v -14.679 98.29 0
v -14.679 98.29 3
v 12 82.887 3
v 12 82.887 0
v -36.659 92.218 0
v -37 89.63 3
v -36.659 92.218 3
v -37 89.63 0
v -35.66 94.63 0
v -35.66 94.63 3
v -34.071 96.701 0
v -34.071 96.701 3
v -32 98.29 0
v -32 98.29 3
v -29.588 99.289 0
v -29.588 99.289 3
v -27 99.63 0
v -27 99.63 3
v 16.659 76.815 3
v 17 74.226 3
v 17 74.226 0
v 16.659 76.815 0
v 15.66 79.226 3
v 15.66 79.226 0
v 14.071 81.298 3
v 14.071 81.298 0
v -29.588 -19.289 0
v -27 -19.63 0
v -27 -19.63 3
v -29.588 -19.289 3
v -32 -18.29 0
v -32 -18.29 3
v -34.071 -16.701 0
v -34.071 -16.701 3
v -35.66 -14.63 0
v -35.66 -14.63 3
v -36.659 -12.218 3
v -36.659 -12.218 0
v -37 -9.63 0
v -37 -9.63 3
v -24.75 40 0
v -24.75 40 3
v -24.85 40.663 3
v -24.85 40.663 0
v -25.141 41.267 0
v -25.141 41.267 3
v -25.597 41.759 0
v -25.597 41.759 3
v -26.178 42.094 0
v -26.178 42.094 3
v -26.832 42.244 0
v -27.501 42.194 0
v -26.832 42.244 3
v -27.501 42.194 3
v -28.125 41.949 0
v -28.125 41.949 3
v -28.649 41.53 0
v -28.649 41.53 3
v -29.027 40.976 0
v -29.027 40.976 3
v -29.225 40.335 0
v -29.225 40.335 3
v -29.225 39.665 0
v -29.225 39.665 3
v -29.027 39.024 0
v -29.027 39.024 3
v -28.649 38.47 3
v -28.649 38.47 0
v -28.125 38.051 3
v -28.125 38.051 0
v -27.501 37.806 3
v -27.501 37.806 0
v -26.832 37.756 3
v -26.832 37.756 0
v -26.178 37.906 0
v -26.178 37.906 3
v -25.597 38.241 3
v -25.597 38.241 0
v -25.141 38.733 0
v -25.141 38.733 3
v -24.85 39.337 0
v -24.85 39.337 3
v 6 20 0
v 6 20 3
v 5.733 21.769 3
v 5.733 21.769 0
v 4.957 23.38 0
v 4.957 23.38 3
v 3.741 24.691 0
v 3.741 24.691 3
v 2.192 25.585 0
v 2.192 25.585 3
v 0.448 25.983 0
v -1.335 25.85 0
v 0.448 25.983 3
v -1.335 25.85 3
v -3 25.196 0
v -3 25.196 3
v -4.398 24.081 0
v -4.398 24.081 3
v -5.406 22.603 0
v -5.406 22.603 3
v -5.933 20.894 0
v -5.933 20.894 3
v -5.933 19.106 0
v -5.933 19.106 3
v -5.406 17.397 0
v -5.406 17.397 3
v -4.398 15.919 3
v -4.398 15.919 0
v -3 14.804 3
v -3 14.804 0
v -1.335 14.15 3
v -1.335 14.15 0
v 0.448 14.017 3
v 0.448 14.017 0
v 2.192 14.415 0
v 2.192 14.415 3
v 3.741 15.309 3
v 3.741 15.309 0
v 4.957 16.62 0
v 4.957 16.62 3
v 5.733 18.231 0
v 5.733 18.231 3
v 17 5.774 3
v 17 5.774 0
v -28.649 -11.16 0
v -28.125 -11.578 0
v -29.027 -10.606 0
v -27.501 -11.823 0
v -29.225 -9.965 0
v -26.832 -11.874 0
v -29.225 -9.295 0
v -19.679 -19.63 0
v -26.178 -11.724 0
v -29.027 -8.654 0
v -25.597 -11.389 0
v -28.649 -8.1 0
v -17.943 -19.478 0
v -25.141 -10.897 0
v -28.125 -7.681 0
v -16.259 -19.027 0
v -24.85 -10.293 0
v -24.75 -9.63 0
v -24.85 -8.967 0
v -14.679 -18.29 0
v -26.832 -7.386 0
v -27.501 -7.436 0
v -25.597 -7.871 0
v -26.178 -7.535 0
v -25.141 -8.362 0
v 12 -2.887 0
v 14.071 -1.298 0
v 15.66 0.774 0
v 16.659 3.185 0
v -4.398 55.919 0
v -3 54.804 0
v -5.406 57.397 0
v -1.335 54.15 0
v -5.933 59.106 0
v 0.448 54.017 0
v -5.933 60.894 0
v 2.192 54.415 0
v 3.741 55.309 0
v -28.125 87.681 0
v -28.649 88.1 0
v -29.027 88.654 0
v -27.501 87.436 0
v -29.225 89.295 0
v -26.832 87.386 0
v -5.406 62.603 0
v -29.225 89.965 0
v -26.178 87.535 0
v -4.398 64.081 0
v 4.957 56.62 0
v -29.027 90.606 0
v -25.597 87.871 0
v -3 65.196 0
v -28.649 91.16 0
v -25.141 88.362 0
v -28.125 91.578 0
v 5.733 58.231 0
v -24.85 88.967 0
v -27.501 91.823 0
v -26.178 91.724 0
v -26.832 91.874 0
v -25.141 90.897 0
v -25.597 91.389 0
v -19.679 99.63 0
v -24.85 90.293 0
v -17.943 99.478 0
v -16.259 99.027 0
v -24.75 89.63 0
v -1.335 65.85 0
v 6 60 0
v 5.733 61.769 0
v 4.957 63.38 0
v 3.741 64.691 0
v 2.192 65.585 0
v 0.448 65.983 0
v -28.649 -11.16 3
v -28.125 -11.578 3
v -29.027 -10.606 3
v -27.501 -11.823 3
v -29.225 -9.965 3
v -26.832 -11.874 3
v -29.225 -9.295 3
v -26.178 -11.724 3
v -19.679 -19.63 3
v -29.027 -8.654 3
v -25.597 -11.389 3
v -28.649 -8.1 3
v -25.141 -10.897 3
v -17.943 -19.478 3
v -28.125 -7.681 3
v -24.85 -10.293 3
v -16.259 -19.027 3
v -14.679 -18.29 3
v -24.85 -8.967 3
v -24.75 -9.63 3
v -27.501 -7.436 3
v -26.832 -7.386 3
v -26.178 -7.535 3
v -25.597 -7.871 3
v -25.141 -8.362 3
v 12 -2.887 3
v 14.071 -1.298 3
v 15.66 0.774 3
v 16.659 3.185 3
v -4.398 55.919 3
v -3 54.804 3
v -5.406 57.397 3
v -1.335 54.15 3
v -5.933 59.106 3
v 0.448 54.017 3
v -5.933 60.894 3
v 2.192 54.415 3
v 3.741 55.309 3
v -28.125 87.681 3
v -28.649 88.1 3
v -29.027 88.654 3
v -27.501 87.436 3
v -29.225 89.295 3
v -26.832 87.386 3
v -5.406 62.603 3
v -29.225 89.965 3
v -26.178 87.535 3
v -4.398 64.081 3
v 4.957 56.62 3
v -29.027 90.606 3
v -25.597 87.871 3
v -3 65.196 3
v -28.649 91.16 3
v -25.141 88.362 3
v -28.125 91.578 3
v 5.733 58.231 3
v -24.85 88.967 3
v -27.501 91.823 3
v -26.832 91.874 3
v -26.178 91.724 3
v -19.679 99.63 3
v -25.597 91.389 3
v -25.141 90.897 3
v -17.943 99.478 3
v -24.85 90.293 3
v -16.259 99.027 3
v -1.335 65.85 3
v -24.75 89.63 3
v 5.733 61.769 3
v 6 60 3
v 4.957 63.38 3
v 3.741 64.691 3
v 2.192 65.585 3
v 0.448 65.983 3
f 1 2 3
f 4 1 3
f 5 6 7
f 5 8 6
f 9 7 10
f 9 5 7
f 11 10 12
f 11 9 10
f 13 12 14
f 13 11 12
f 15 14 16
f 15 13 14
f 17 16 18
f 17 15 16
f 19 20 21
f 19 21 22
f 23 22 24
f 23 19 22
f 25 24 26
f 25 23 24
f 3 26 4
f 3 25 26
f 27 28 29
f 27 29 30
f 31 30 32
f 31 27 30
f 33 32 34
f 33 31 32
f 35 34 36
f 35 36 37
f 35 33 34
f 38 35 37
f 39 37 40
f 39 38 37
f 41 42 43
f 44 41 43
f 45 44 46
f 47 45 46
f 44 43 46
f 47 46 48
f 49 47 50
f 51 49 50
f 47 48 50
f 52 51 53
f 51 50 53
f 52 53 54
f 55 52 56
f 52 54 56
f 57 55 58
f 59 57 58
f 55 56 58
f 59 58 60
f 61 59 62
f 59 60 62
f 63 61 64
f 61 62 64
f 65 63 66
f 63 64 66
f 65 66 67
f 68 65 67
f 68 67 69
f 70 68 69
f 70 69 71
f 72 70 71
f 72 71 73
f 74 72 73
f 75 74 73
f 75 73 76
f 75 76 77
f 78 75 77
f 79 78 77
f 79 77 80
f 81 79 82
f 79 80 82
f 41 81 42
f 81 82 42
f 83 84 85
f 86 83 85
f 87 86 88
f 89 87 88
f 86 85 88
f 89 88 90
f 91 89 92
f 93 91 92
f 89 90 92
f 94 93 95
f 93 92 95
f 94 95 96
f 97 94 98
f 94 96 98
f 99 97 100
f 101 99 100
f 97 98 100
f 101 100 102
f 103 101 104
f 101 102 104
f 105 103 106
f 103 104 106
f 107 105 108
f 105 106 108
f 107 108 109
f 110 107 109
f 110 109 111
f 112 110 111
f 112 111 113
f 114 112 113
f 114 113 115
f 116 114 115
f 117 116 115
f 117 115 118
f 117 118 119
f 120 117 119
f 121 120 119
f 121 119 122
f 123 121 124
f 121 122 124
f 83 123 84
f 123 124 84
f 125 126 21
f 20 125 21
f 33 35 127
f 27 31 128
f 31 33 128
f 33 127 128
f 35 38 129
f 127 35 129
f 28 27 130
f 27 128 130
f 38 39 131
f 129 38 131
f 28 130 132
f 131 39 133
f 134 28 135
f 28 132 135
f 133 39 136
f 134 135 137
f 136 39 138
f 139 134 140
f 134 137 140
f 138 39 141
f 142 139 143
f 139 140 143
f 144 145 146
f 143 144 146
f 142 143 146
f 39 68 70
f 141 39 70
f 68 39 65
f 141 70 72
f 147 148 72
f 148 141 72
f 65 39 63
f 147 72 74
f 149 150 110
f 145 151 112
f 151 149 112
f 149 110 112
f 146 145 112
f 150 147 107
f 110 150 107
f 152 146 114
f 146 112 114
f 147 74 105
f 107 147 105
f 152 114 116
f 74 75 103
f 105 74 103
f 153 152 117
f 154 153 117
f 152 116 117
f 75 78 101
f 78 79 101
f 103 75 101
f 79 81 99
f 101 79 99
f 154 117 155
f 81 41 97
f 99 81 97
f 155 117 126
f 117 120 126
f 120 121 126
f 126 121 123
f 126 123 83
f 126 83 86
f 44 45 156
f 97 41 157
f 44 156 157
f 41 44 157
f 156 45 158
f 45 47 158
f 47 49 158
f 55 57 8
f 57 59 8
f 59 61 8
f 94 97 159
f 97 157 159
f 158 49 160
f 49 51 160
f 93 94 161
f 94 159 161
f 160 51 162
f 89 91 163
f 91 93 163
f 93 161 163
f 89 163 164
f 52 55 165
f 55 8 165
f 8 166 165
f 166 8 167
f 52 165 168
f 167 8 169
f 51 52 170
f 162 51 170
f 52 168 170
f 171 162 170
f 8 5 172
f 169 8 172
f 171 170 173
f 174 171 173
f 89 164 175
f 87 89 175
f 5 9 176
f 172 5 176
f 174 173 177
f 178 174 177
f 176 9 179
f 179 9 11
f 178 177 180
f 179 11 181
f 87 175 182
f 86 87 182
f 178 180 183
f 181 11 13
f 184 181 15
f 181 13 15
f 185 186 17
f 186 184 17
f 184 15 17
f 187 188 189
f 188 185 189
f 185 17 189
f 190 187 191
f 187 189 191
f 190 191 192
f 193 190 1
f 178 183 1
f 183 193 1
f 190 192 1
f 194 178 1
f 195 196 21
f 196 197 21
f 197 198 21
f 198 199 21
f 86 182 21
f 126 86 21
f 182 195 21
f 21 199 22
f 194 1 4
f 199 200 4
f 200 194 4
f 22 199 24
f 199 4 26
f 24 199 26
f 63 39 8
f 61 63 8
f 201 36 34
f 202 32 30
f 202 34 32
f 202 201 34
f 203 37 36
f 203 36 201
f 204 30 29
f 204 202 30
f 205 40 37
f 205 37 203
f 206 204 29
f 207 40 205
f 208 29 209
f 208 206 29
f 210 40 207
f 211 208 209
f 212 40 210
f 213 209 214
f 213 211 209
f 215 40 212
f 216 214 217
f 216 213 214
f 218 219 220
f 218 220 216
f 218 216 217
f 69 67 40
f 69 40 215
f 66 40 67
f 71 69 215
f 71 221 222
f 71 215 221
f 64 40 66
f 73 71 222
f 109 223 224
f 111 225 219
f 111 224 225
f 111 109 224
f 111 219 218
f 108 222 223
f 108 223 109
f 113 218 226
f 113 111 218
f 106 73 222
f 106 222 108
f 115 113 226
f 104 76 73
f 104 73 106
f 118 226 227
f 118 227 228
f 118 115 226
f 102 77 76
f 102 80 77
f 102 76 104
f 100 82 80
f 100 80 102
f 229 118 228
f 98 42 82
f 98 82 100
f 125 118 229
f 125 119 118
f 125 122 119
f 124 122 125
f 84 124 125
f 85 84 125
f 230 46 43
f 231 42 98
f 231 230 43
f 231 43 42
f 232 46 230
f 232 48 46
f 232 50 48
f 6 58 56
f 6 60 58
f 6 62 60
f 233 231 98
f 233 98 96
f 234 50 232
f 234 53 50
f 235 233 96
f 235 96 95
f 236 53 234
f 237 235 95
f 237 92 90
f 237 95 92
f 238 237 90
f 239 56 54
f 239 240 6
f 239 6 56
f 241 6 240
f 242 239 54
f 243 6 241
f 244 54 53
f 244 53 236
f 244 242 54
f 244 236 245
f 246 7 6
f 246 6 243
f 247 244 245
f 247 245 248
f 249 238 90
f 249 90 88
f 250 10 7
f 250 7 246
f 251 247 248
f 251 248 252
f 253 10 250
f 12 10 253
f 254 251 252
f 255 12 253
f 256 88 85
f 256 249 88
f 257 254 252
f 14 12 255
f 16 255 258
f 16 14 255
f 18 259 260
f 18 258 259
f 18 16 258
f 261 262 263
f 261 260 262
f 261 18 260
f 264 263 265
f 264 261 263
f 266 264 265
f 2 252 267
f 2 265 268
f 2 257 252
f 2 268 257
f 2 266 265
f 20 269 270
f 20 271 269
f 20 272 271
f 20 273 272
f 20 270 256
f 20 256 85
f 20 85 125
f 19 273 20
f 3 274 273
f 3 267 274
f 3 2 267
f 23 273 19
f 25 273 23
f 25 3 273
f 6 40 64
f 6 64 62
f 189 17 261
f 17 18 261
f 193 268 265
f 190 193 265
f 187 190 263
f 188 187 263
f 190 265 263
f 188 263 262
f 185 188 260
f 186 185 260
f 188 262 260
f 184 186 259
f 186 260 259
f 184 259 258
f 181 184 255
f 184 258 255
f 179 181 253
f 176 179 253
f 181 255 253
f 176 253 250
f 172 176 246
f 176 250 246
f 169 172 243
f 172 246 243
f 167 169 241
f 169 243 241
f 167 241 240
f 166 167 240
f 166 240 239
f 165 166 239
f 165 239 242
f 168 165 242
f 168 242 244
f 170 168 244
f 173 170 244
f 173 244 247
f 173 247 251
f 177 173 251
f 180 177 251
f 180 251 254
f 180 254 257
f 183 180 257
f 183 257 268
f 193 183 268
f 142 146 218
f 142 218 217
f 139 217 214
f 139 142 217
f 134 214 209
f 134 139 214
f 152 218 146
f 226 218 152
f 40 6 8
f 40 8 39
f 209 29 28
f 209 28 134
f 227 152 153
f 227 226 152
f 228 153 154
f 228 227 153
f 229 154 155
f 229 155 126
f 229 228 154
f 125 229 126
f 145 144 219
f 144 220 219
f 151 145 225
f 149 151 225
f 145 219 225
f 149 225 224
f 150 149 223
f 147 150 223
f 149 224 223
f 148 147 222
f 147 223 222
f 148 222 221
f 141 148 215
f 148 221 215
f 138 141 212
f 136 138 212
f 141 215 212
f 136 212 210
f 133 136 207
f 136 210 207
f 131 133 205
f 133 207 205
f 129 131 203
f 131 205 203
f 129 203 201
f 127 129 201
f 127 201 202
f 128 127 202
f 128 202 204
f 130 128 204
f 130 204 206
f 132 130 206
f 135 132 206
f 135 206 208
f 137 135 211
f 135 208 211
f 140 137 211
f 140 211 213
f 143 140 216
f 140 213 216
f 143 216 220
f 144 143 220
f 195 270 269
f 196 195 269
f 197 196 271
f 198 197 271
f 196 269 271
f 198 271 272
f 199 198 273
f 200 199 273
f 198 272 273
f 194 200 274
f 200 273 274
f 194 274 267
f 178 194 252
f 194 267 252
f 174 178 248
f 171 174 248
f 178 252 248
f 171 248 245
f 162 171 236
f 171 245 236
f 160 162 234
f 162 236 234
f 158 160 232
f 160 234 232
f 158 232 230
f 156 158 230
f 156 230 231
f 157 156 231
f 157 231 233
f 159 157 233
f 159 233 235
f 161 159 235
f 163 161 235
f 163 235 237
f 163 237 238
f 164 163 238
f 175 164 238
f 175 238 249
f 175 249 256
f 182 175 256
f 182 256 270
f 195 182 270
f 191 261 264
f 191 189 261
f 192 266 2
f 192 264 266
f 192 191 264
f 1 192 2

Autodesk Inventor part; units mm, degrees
ref_plane "YZ Plane" through (0, 0, 0) normal (1, 0, 0) x (0, 1, 0)
ref_plane "XZ Plane" through (0, 0, 0) normal (0, 1, 0) x (-1, 0, 0)
ref_plane "XY Plane" through (0, 0, 0) normal (0, 0, 1) x (1, 0, 0)
sketch "スケッチ1" plane through (0, 0, 0) normal (0, 0, 1) x (1, 0, 0)
  line L0 (17, 0) -> (17, 80)
  line L1 (17, 80) -> (0, 80)
  line L2 (0, 80) -> (0, 0) construction
  line L3 (-17, 0) -> (-17, 80)
  line L4 (-17, 80) -> (0, 80)
  line L5 (-17, 0) -> (17, 0)
  dimension "d75" = 34
  dimension "d86" = 80
extrude "プレート1" add sketch "スケッチ1" along normal blind 3
sketch "スケッチ3" plane through (0, 0, 3) normal (0, 0, 1) x (1, 0, 0)
  line L0 (-17, 80) -> (17, 80) construction
  line L1 (-17, 0) -> (-17, 80) construction
  line L2 (17, 80) -> (17, 0) construction
  line L3 (0, 0) -> (0, 80) construction
  line L4 (-17, 40) -> (17, 40) construction
  circle A0 centre (0, 60) radius 6
  circle A1 centre (0, 20) radius 6
  line L5 (17, 0) -> (-17, 0) projected
  point P0 (0, 0)
  dimension "d8" = 12
  dimension "d9" = 20
  dimension "d10" = 20
extrude "切り取り1" cut sketch "スケッチ3" against normal blind 3
sketch "スケッチ14" plane through (0, 0, 3) normal (0, 0, 1) x (1, 0, 0)
  line L0 (-17, 80) -> (17, 80)
  line L1 (-17, 0) -> (-17, 80)
  line L2 (17, 0) -> (-17, 0)
  line L3 (-37, 99.6299) -> (-37, -19.6299)
  line L4 (-37, -19.6299) -> (-17, -19.6299)
  line L5 (17, 0) -> (17, 80)
  line L6 (-17, -19.6299) -> (17, 0)
  line L7 (-37, 99.6299) -> (-17, 99.6299)
  line L8 (-17, 99.6299) -> (17, 80)
  line L9 (-27, 99.6299) -> (-27, -19.6299) construction
  line L10 (-27, 40) -> (-37, 40) construction
  circle A0 centre (-27, 89.6299) radius 2.25
  circle A1 centre (-27, -9.6299) radius 2.25
  circle A2 centre (-27, 40) radius 2.25
  point P0 (0, 0)
  dimension "d87" = 20
  dimension "d88" = 30
  dimension "d89" = 30
  dimension "d90" = 4.5
  dimension "d91" = 10
  dimension "d92" = 10
sheet face with bend "面3" sketch "スケッチ14" thickness 3 toward (0, 0, -1) bend radius 0 contours L1 L2 L6 L4 L3 L7 L8 L0
bend "曲げ5"
fillet "フィレット4" radius 10 6 edges at (-37, 99.6299, 1.5) (-17, 99.6299, 1.5) (17, 80, 1.5) (17, 0, 1.5) (-17, -19.6299, 1.5) (-37, -19.6299, 1.5)
equation "\"d11\" = Thickness"
equation "\"d89\" = d88"
equation "\"d92\" = d91"
equation "\"d5\" = Thickness"
equation "\"d10\" = d9"
equation "\"d94\" = BendReliefWidth"
equation "\"d96\" = MinimumRemnant"
equation "\"d95\" = BendReliefDepth"
equation "\"BendReliefWidth\" = Thickness"
equation "\"BendReliefDepth\" = 0.5 * Thickness"
equation "\"CornerReliefSize\" = 4 * Thickness"
equation "\"MinimumRemnant\" = 2 * Thickness"
equation "\"GapSize\" = Thickness"
equation "\"Thickness\" = 3"
properties part number "robocup_power_sw_plate" material "アルミニウム 6061"
